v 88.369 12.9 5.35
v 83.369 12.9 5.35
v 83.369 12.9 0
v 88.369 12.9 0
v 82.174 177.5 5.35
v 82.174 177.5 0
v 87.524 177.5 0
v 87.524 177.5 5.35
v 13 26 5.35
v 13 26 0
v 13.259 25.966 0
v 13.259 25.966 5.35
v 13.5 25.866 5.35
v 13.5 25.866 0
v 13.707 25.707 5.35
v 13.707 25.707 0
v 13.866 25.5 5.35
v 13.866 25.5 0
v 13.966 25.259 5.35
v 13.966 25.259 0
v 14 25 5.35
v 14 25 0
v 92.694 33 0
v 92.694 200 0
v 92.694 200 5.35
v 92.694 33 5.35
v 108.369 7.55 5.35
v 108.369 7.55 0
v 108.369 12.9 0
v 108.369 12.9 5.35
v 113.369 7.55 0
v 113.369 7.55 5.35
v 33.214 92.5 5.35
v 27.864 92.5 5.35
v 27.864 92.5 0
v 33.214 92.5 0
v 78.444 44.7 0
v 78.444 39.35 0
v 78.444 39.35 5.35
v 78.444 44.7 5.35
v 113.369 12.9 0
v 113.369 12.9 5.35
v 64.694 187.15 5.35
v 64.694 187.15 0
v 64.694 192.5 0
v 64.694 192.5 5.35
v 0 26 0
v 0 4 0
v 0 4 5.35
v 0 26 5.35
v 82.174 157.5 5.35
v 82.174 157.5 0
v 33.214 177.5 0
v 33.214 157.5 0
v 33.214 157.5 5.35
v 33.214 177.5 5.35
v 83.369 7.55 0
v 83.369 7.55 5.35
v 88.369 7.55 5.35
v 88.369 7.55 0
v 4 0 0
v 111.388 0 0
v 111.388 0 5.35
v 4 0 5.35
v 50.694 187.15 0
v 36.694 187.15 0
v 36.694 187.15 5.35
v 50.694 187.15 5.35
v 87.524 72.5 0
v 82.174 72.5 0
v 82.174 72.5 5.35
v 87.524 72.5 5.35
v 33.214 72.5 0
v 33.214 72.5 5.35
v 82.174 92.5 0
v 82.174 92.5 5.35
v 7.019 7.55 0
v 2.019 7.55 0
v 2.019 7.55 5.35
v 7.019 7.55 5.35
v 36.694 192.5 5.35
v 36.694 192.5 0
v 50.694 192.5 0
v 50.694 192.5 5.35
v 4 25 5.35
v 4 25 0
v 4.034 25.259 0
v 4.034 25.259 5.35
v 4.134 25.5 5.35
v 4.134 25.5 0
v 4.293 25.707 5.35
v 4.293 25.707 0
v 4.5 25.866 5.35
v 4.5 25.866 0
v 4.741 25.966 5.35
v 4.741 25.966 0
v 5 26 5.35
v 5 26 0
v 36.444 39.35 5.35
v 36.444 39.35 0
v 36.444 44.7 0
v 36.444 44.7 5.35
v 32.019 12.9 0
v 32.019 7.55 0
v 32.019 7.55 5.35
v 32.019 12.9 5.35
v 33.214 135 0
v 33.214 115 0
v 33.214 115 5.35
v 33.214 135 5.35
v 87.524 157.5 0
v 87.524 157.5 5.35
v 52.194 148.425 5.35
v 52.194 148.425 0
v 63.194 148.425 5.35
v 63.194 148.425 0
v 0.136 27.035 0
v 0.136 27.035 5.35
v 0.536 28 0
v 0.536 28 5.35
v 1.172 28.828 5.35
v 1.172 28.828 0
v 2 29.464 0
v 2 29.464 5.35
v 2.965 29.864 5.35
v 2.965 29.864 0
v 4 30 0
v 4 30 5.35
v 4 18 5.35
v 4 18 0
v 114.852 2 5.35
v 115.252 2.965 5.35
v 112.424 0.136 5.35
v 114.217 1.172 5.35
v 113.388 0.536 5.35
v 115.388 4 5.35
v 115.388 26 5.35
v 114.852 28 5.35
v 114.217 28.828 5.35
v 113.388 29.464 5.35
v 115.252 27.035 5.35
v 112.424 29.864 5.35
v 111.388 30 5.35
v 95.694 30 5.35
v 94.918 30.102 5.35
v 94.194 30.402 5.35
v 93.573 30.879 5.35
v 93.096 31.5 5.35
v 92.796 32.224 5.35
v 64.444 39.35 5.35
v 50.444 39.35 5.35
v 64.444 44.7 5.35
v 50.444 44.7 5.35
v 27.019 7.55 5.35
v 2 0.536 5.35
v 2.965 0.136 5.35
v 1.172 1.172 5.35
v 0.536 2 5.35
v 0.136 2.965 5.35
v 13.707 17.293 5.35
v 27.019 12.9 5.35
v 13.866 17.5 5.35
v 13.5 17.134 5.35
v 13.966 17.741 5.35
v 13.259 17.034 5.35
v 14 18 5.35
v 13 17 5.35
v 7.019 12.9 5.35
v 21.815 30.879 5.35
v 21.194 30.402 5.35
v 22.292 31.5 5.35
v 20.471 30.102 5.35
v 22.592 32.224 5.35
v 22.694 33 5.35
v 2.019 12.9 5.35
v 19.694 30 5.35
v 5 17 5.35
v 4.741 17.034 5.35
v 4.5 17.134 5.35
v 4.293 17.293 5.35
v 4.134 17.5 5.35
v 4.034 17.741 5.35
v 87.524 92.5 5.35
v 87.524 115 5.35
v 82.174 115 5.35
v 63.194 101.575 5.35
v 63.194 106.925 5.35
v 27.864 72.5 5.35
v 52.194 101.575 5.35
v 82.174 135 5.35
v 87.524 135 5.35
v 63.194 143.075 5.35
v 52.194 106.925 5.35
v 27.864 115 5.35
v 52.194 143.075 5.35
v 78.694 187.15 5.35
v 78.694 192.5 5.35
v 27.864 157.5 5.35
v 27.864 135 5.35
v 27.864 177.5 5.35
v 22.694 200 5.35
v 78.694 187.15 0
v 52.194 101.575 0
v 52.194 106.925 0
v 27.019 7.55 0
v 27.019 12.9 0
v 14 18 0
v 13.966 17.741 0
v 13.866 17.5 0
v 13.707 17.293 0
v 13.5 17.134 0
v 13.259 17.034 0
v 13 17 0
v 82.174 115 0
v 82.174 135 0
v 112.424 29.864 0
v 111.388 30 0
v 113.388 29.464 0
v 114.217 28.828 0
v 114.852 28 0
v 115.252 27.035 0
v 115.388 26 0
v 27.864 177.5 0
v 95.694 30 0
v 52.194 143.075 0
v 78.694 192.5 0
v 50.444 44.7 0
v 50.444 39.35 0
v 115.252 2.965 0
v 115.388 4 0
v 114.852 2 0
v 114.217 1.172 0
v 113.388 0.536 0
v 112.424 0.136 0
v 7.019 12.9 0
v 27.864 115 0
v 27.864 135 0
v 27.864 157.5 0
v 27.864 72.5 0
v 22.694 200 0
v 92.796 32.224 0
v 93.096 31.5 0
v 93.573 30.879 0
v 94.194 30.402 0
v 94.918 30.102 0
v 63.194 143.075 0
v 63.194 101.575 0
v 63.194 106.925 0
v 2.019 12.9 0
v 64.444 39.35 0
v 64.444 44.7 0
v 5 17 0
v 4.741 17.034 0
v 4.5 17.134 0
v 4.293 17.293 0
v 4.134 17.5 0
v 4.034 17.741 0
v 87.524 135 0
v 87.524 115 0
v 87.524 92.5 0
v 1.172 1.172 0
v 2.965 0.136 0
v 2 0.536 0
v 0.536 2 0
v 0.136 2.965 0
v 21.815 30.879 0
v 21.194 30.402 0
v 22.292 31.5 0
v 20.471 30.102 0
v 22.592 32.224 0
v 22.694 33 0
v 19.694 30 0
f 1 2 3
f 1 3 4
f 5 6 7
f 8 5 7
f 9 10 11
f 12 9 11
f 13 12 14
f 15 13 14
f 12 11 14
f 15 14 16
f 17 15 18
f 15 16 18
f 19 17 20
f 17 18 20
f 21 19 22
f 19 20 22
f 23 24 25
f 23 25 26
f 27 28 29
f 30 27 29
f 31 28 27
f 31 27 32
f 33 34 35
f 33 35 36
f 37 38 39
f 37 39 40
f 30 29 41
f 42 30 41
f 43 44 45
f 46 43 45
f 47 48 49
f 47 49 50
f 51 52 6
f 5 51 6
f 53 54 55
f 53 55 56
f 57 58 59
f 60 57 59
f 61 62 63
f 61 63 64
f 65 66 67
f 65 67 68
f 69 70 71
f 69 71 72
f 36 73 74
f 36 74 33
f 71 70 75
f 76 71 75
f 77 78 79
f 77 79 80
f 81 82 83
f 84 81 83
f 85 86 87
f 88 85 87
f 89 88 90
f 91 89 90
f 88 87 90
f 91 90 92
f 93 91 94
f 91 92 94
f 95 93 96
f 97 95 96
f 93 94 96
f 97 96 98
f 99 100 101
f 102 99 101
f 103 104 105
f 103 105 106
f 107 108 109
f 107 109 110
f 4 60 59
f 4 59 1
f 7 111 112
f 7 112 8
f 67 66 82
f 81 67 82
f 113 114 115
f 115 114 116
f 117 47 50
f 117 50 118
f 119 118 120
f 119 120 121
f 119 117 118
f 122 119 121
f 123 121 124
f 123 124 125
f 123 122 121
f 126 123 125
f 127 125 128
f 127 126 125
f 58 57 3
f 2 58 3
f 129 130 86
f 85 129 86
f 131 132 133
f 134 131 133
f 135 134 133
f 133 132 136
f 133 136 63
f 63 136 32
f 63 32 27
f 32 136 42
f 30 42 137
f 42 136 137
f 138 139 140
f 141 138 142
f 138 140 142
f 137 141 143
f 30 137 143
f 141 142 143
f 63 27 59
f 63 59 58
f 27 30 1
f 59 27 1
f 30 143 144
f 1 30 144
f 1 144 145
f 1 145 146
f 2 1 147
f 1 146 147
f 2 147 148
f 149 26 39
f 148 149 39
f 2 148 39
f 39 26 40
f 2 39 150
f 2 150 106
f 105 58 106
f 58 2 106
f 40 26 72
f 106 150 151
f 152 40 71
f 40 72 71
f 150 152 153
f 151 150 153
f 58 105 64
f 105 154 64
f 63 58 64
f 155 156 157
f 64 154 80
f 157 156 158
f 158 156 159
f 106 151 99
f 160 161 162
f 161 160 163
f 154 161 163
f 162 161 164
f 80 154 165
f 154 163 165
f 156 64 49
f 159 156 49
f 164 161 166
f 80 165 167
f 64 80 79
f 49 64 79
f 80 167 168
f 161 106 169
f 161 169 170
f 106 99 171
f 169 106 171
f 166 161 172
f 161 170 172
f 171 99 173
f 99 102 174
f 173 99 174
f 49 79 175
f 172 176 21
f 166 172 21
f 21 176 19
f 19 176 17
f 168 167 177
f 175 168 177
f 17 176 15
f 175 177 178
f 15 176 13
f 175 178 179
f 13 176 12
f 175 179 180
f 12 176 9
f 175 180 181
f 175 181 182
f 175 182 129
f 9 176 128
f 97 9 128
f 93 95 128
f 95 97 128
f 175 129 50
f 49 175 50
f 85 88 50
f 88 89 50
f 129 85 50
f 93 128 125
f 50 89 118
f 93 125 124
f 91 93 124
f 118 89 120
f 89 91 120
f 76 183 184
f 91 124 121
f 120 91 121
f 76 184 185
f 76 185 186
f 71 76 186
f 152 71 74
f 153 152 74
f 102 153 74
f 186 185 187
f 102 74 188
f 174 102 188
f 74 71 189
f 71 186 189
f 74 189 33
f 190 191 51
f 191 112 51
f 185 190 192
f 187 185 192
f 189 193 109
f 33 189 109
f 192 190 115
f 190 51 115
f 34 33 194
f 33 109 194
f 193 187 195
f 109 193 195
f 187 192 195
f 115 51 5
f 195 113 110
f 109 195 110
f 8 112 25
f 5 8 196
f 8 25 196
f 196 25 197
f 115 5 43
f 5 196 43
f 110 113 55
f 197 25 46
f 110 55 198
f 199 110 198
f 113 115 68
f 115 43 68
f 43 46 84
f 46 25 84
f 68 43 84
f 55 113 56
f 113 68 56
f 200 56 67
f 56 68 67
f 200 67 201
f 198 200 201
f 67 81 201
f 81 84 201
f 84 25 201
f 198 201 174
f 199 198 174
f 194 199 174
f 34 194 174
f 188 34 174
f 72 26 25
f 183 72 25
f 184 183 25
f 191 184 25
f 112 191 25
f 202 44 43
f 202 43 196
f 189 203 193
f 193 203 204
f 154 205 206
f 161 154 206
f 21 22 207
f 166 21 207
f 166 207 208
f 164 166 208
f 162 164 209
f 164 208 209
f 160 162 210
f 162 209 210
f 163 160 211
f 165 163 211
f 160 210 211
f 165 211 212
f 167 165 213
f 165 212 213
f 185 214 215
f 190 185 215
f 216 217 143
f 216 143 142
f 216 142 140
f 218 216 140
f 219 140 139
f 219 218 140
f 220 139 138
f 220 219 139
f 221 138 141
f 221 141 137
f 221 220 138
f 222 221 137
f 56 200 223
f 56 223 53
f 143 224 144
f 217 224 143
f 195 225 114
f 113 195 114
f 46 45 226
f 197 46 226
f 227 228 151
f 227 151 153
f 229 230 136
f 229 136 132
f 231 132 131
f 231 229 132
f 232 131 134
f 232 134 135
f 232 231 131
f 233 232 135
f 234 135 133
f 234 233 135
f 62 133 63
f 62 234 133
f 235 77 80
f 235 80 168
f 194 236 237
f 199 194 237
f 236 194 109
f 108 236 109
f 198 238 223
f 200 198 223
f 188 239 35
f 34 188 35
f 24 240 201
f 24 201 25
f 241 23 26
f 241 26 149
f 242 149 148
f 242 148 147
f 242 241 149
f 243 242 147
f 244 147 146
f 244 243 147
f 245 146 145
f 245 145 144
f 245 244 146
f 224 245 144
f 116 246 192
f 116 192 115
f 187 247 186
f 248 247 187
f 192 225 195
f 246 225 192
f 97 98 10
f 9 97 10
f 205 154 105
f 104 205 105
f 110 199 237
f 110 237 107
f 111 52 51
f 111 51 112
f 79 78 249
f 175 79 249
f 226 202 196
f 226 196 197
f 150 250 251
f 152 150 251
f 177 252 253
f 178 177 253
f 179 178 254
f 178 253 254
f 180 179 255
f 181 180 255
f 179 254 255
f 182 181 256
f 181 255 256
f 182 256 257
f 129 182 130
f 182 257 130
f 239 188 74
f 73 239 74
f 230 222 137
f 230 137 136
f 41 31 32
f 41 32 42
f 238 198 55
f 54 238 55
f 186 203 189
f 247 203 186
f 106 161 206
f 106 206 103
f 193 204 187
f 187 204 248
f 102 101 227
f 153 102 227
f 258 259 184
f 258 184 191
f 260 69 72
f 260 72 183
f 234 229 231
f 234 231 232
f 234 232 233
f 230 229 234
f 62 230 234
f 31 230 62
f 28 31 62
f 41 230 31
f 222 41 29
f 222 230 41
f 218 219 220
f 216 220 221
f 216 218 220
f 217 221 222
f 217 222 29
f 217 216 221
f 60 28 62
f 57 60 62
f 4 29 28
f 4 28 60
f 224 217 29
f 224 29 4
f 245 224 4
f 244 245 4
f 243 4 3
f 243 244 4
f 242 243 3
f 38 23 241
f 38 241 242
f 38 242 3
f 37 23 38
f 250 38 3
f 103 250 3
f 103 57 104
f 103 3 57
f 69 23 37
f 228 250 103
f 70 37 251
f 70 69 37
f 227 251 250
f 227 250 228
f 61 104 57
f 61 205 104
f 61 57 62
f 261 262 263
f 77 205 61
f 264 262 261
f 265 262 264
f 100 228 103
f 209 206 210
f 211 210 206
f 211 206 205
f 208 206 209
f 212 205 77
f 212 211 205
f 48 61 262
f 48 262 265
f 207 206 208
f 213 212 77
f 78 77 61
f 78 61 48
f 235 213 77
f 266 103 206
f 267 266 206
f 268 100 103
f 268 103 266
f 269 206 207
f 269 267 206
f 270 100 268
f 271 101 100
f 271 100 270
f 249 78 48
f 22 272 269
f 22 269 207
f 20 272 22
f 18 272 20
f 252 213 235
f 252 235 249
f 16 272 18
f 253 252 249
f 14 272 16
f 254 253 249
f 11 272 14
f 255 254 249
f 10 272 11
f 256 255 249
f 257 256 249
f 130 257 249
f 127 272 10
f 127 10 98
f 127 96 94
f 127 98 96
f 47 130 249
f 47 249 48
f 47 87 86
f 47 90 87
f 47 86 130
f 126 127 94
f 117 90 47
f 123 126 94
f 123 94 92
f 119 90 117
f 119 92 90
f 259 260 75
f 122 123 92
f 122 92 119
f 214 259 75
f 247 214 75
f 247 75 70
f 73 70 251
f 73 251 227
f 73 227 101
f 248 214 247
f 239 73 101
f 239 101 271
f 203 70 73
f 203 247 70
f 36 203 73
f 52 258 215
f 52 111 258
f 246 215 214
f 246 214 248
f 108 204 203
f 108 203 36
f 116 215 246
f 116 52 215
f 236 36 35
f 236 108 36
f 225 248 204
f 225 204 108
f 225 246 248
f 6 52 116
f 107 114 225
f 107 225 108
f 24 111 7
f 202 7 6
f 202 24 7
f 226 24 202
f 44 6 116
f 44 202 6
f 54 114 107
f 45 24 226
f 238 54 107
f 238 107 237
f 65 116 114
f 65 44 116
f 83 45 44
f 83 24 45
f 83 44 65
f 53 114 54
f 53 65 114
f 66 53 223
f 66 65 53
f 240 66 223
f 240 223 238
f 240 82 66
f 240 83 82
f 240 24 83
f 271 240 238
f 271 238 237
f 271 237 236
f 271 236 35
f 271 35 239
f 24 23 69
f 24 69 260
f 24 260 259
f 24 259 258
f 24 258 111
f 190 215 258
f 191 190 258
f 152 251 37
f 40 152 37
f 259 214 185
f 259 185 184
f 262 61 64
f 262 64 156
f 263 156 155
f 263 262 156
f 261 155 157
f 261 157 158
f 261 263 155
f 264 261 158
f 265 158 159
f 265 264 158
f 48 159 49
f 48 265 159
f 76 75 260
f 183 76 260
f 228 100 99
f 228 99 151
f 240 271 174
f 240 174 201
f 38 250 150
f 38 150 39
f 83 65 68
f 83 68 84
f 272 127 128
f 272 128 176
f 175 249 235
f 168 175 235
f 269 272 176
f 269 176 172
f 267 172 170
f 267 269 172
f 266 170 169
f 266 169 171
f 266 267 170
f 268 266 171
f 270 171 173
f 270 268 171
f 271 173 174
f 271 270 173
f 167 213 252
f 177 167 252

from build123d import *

# Parameters (mm, degrees)
MODEL_W             = 5.350000225
MODEL_H             = 20.000001416
MODEL_W_2           = 5.349997431
MODEL_W_3           = 11.000000872
MODEL_H_2           = 5.350001156
MODEL_H_3           = 19.999999553
MODEL_H_4           = 20.000003278
MODEL_W_4           = 13.99999857
MODEL_H_5           = 5.350008607
MODEL_W_5           = 14.000000433
MODEL_W_6           = 13.999999967
MODEL_H_6           = 5.350000225
MODEL_W_7           = 4.999999888
MODEL_H_7           = 5.349997431
MODEL_W_8           = 4.999998957
MODEL_W_9           = 5.000002682
BOSS_EXTRUDE1_DEPTH = 5.35


with BuildPart() as part:
    # Model → Boss-Extrude1 (new body)
    with BuildSketch(Plane.XY):
        with BuildLine():
            Line((4.000000656, 29.99999933), (19.694138318, 29.99999933))
            ThreePointArc((19.694138318, 29.99999933), (21.815457776, 30.878679471), (22.694136947, 32.999999329))
            Line((22.694136947, 32.999999329), (22.694136947, 199.99999553))
            Line((22.694136947, 199.99999553), (92.694137245, 199.99999553))
            Line((92.694137245, 199.99999553), (92.694137245, 32.999999821))
            ThreePointArc((92.694137245, 32.999999821), (93.572816728, 30.87867916), (95.694137245, 29.99999933))
            Line((95.694137245, 29.99999933), (111.388277918, 29.99999933))
            ThreePointArc((111.388277918, 29.99999933), (114.216704616, 28.828426881), (115.388277918, 26.000000537))
            Line((115.388277918, 26.000000537), (115.388277918, 4))
            ThreePointArc((115.388277918, 4), (114.216704811, 1.171572643), (111.388277262, 0))
            Line((111.388277262, 0), (4, 0))
            ThreePointArc((4, 0), (1.171572643, 1.171573107), (0, 4.000000656))
            Line((0, 4.000000656), (0, 25.99999933))
            ThreePointArc((0, 25.99999933), (1.171573107, 28.828426686), (4.000000656, 29.99999933))
        make_face()
        with Locations((84.849137348, 82.500000484)):
            Rectangle(MODEL_W, MODEL_H, mode=Mode.SUBTRACT)
        with Locations((30.539138243, 82.500000484)):
            Rectangle(MODEL_W_2, MODEL_H, mode=Mode.SUBTRACT)
        with Locations((57.694137562, 104.249998927)):
            Rectangle(MODEL_W_3, MODEL_H_2, mode=Mode.SUBTRACT)
        with Locations((84.849137348, 124.999998138)):
            Rectangle(MODEL_W, MODEL_H_3, mode=Mode.SUBTRACT)
        with Locations((30.539138243, 124.999998138)):
            Rectangle(MODEL_W_2, MODEL_H_3, mode=Mode.SUBTRACT)
        with Locations((30.539138243, 167.500000447)):
            Rectangle(MODEL_W_2, MODEL_H_4, mode=Mode.SUBTRACT)
        with Locations((84.849137348, 167.500000447)):
            Rectangle(MODEL_W, MODEL_H_4, mode=Mode.SUBTRACT)
        with Locations((57.694137562, 145.749997348)):
            Rectangle(MODEL_W_3, MODEL_H_2, mode=Mode.SUBTRACT)
        with Locations((43.694138527, 189.824998379)):
            Rectangle(MODEL_W_4, MODEL_H_5, mode=Mode.SUBTRACT)
        with Locations((71.694137529, 189.824998379)):
            Rectangle(MODEL_W_5, MODEL_H_5, mode=Mode.SUBTRACT)
        with Locations((71.444137721, 42.024999392)):
            Rectangle(MODEL_W_6, MODEL_H_6, mode=Mode.SUBTRACT)
        with Locations((43.44413802, 42.024999392)):
            Rectangle(MODEL_W_4, MODEL_H_6, mode=Mode.SUBTRACT)
        with Locations((85.869137663, 10.22499986)):
            Rectangle(MODEL_W_7, MODEL_H_7, mode=Mode.SUBTRACT)
        with Locations((110.869137571, 10.22499986)):
            Rectangle(MODEL_W_8, MODEL_H_7, mode=Mode.SUBTRACT)
        with Locations((4.519138485, 10.22499986)):
            Rectangle(MODEL_W_9, MODEL_H_7, mode=Mode.SUBTRACT)
        with Locations((29.519138858, 10.22499986)):
            Rectangle(MODEL_W_8, MODEL_H_7, mode=Mode.SUBTRACT)
        with BuildLine():
            Line((12.999996543, 17.000000924), (5.000000656, 17.000000924))
            ThreePointArc((5.000000656, 17.000000924), (4.292894475, 17.292893542), (4.000000656, 17.999999225))
            Line((4.000000656, 17.999999225), (4.000000656, 25.000000537))
            ThreePointArc((4.000000656, 25.000000537), (4.292891957, 25.7071054), (4.999995232, 26.000000536))
            Line((4.999995232, 26.000000536), (12.99999857, 26.000000536))
            ThreePointArc((12.99999857, 26.000000536), (13.707106067, 25.707106601), (13.99999857, 24.99999851))
            Line((13.99999857, 24.99999851), (13.99999857, 18.000000924))
            ThreePointArc((13.99999857, 18.000000924), (13.707104634, 17.292893426), (12.999996543, 17.000000924))
        make_face(mode=Mode.SUBTRACT)
    extrude(amount=BOSS_EXTRUDE1_DEPTH)


solid = part.part
